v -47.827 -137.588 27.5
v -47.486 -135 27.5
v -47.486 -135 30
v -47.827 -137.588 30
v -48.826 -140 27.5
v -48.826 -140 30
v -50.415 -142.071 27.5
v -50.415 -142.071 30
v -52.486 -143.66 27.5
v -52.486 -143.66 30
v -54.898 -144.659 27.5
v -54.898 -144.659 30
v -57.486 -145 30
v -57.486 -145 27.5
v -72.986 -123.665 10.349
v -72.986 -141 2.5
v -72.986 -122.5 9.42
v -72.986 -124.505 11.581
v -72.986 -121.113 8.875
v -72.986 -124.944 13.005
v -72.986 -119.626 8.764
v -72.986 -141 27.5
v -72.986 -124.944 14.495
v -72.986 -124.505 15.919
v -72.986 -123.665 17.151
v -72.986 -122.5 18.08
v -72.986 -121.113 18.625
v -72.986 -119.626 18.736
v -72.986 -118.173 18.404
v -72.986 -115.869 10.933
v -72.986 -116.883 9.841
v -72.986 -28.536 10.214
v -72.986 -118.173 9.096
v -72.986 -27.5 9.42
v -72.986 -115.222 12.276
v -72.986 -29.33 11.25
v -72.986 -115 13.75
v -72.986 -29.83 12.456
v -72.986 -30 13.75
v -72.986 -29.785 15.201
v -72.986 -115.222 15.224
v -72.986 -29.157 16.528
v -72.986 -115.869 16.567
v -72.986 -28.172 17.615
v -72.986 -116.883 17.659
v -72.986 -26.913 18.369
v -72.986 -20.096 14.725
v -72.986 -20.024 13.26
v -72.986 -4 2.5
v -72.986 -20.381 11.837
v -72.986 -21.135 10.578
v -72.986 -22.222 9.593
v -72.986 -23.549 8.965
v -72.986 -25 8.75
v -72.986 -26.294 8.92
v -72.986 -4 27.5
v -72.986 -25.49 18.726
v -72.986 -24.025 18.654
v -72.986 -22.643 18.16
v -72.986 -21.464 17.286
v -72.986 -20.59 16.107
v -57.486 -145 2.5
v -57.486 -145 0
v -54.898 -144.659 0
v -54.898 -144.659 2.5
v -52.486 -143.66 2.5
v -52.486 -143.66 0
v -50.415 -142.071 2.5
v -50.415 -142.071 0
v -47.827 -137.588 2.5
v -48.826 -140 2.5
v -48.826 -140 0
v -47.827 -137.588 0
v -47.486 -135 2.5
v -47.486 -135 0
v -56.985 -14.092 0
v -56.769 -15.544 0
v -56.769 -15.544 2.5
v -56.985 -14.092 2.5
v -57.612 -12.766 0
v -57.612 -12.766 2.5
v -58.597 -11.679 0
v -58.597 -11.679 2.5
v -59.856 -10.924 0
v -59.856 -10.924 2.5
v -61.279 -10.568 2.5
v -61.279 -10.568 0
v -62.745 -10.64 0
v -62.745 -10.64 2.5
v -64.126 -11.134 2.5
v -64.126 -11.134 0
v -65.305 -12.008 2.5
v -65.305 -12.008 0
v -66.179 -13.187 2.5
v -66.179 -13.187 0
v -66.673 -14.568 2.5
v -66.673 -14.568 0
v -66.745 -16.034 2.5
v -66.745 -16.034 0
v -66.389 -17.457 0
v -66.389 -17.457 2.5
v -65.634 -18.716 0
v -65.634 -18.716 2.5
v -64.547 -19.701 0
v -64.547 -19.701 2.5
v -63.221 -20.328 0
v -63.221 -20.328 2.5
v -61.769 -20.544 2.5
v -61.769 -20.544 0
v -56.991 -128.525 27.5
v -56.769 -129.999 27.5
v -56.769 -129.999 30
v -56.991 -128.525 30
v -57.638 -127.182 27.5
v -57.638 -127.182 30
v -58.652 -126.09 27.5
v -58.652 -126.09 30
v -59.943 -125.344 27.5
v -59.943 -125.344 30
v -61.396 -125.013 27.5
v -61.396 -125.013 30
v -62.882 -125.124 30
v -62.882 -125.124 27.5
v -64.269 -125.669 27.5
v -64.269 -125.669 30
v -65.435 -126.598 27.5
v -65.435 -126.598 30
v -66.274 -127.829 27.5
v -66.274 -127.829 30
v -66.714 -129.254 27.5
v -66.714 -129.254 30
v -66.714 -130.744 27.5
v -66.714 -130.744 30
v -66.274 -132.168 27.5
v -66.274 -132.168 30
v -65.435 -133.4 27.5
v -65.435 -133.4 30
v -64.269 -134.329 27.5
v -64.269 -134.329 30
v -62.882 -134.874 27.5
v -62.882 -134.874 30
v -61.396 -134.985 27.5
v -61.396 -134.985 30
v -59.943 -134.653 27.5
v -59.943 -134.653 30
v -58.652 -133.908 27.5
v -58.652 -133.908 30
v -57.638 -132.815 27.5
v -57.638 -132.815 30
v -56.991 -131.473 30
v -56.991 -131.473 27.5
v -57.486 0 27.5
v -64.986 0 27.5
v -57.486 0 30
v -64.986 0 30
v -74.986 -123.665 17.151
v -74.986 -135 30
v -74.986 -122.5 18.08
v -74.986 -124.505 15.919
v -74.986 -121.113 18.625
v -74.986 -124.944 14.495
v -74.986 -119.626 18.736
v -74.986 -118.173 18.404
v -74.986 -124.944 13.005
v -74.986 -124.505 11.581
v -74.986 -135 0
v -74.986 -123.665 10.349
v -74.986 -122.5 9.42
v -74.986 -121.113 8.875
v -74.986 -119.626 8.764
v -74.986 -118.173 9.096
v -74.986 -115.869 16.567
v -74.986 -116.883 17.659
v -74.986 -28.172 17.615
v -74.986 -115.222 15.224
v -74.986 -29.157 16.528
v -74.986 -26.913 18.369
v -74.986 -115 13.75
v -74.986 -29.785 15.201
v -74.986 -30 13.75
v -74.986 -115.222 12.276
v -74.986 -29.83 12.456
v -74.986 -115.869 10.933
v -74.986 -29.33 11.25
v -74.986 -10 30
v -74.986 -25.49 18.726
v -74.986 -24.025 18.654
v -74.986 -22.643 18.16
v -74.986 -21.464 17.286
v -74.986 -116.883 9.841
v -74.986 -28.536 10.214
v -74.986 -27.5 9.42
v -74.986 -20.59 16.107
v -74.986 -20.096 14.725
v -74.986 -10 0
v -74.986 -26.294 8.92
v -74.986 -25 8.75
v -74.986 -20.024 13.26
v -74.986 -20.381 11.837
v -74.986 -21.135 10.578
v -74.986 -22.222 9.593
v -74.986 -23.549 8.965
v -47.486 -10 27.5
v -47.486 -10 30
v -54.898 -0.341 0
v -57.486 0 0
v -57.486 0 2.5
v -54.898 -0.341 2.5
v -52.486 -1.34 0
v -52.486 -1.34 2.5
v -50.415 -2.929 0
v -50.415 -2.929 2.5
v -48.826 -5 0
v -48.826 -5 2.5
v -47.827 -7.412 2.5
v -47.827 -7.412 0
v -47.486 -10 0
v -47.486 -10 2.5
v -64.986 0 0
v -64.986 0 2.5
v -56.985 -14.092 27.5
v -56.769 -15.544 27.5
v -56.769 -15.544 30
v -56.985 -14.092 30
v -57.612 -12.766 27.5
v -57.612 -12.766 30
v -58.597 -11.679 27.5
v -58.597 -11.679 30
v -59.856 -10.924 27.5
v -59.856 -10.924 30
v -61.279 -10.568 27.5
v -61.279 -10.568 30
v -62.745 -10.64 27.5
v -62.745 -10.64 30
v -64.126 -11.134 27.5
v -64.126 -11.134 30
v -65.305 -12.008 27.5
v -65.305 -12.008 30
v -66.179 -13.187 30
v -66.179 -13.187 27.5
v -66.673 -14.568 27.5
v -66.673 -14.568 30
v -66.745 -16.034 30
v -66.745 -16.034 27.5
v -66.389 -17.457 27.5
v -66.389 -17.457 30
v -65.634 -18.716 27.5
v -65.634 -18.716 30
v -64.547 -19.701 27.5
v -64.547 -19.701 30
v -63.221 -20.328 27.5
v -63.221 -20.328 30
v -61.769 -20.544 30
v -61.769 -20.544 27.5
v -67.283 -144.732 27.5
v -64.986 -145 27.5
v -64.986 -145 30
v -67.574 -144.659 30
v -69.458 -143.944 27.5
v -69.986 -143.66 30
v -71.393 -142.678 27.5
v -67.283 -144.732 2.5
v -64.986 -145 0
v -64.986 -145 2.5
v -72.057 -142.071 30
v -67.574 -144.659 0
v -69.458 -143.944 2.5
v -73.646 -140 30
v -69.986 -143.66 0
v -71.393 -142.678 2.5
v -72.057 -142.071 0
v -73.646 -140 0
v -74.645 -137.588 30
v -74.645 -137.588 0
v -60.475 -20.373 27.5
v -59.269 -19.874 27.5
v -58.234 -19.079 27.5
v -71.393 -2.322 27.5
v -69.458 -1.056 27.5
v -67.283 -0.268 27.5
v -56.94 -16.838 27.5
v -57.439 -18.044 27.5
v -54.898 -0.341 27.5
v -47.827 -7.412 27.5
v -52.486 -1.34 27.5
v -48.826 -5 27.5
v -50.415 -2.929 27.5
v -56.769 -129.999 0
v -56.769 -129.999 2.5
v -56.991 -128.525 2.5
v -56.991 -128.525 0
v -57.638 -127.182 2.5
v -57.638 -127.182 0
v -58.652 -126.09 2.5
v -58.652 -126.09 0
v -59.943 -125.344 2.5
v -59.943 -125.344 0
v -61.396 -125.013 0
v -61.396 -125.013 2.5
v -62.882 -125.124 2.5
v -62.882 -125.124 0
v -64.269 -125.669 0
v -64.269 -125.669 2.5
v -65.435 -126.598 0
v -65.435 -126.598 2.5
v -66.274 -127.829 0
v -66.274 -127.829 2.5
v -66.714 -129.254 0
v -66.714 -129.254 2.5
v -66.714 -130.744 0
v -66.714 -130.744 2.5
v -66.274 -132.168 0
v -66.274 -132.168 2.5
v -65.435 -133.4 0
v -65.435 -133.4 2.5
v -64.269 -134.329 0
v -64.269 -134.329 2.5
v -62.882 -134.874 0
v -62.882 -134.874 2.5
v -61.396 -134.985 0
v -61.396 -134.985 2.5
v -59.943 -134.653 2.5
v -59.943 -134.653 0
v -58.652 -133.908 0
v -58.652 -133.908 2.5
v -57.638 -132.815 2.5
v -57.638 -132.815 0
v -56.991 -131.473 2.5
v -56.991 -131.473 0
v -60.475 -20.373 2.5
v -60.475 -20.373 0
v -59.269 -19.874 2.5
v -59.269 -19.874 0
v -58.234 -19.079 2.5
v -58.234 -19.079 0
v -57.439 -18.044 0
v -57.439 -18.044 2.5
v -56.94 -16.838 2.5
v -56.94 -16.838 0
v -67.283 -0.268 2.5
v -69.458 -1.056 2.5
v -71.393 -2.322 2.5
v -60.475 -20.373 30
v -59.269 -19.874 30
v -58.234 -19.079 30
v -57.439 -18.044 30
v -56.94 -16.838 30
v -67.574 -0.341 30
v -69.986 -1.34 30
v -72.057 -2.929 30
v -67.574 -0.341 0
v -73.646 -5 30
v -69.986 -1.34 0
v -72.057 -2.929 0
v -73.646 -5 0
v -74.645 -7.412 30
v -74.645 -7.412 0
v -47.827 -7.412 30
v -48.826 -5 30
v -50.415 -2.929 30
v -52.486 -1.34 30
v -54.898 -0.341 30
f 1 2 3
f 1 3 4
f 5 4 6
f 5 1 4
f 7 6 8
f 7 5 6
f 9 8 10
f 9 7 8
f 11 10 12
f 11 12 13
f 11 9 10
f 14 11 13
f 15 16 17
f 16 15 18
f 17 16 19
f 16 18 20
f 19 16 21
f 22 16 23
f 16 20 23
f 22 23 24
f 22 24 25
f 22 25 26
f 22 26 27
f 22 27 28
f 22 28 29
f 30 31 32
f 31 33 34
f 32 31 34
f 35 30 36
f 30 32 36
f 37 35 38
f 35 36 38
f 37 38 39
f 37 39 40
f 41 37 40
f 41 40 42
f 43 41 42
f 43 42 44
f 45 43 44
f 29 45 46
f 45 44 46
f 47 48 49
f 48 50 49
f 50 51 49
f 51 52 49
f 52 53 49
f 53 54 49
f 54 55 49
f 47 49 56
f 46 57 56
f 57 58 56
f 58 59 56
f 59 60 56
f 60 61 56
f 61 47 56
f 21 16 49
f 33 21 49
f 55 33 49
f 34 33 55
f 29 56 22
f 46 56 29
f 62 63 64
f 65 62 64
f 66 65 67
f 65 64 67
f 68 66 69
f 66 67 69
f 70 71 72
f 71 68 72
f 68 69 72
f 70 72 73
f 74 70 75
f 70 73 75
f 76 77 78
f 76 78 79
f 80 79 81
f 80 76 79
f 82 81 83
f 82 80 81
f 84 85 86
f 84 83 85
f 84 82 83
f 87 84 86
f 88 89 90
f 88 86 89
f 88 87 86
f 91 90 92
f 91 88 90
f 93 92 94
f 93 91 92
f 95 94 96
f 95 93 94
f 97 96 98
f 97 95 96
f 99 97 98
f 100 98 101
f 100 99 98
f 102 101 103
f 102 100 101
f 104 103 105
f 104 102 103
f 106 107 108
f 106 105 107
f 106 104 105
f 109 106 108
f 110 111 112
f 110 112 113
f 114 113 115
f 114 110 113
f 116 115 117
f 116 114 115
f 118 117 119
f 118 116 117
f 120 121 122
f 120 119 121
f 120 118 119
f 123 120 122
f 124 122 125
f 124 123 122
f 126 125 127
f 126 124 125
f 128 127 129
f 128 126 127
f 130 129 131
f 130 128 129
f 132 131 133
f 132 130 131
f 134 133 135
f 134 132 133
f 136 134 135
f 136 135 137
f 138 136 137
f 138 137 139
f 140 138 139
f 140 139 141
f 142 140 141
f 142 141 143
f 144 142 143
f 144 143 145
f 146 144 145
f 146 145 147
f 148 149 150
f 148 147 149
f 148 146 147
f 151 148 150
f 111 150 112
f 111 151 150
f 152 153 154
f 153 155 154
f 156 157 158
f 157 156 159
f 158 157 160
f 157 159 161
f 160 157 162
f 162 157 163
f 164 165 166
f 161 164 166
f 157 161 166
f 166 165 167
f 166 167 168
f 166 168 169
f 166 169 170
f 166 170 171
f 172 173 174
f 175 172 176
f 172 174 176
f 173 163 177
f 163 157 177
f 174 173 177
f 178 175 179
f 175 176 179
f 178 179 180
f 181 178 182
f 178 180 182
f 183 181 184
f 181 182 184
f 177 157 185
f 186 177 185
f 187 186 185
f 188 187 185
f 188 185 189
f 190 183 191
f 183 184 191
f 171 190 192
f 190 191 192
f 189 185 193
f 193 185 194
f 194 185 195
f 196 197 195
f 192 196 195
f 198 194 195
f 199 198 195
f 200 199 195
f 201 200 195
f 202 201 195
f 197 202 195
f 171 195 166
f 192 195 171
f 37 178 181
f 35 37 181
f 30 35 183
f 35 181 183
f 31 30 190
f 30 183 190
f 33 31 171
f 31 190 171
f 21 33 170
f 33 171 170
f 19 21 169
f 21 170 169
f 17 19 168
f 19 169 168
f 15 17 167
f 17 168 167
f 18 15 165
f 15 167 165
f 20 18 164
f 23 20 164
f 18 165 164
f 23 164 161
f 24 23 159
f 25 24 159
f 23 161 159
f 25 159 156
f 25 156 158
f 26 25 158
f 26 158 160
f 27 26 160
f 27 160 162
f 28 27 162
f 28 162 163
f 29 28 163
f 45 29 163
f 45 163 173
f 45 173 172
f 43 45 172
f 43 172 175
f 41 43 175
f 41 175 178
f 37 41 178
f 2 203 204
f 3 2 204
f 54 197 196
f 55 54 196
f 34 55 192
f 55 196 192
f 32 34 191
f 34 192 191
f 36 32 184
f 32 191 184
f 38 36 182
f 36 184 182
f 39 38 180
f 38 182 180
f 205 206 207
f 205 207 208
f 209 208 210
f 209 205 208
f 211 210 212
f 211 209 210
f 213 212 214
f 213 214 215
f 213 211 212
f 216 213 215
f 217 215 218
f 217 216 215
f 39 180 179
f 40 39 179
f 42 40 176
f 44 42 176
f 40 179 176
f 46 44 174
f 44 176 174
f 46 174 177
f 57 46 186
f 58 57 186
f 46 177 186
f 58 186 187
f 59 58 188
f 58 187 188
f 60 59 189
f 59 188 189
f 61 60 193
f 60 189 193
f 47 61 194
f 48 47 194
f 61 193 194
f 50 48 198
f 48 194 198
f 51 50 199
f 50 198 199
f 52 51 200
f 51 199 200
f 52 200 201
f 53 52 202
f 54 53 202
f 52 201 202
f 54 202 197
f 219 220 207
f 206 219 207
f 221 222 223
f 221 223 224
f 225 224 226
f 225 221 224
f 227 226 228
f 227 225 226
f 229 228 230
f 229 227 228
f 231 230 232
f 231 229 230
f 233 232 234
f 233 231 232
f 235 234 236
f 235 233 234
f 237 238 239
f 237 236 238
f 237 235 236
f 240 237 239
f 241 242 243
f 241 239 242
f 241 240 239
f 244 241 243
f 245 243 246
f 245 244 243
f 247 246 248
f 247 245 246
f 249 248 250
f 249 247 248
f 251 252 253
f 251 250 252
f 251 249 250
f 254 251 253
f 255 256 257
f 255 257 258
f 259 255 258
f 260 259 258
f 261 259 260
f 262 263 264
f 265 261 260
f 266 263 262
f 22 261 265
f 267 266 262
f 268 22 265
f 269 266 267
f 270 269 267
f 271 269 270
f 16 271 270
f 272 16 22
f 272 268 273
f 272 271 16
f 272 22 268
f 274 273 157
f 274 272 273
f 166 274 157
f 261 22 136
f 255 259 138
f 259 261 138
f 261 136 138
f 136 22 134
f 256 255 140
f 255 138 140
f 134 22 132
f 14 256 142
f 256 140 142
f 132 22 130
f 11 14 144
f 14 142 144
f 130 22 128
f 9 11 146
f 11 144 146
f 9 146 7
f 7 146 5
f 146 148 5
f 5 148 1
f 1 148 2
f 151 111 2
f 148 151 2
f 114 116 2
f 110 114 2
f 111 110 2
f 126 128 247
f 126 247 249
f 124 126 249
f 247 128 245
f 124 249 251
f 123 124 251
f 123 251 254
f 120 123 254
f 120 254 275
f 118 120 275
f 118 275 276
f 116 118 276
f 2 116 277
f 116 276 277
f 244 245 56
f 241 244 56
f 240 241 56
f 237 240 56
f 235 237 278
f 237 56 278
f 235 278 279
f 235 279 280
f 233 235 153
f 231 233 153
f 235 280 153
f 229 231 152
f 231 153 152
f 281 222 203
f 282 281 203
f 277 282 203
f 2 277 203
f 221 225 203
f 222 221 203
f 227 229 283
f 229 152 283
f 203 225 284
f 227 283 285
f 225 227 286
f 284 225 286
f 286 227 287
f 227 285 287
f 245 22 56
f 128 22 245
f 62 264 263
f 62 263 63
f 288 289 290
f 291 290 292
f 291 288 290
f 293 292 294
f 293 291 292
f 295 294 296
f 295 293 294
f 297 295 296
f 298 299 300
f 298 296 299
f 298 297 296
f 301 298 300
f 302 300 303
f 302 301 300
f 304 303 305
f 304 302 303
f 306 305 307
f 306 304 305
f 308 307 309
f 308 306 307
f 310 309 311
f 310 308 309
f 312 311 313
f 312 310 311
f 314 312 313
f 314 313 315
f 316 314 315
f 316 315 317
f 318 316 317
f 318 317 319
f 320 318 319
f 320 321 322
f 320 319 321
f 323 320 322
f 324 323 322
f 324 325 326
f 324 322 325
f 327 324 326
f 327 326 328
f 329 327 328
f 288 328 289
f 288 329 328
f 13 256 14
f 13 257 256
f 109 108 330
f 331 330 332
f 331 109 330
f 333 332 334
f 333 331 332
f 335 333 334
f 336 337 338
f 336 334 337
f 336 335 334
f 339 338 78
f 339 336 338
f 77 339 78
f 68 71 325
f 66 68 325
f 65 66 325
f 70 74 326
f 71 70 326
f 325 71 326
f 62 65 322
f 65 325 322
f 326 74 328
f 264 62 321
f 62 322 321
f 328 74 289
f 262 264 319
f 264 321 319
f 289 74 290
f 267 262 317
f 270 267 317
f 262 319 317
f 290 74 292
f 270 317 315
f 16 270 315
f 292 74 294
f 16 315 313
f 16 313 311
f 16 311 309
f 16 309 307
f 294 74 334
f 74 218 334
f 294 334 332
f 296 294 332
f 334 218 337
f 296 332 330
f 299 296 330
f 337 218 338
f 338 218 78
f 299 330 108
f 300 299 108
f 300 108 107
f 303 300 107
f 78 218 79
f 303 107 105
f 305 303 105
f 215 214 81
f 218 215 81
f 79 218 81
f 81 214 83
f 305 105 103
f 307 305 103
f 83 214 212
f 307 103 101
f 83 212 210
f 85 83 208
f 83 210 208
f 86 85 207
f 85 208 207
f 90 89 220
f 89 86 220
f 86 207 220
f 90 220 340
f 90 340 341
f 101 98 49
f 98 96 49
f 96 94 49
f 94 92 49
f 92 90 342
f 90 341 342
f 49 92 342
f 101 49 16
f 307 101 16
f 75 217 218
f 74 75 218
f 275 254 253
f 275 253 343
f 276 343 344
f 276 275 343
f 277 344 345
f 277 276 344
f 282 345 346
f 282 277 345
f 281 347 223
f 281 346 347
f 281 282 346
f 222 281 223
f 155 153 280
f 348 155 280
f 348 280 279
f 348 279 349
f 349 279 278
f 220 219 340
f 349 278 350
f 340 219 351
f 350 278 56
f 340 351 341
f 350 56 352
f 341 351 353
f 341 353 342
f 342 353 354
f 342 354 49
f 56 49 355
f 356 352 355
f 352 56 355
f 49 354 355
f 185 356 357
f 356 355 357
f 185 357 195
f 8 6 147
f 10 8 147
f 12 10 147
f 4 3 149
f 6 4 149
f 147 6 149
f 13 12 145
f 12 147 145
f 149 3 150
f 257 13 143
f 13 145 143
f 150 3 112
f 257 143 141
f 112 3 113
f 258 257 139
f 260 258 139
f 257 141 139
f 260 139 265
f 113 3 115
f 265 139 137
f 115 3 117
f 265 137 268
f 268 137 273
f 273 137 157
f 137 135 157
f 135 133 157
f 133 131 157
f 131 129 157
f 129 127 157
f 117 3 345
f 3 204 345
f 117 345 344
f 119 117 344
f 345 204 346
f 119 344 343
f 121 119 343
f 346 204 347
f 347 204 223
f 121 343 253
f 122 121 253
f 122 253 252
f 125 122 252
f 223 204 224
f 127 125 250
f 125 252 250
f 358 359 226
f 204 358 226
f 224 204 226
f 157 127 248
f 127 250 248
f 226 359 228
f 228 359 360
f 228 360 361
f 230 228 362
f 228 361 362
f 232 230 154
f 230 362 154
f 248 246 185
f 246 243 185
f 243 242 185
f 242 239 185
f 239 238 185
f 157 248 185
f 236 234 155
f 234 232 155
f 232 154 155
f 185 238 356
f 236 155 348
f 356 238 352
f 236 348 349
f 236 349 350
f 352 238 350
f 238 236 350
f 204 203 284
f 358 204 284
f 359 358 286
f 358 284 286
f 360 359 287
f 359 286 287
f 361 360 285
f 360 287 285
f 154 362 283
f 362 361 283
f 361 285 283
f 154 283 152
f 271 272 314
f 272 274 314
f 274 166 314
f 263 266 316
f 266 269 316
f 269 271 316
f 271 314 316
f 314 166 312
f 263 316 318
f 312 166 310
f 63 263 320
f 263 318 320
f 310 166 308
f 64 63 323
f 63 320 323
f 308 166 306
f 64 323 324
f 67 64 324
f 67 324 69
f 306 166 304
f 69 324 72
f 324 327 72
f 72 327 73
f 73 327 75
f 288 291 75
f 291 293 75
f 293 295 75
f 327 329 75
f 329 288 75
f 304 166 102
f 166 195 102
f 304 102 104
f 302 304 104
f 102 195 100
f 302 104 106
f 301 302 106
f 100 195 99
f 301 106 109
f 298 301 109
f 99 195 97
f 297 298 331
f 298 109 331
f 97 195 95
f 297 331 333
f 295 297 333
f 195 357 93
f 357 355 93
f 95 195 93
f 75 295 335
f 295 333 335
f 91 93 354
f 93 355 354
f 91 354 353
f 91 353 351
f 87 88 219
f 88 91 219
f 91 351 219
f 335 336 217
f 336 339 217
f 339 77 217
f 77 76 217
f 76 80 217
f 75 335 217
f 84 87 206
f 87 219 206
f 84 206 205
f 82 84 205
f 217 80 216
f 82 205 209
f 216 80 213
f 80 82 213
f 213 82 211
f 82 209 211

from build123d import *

# Parameters (mm, degrees)
F2_DEPTH    = 145
F1_R        = 5
F3_DEPTH    = 46
F4_T1_DEPTH = 52.5
F4_T3_DEPTH = 52.5
F4_T5_DEPTH = 80
F7_DEPTH    = 25


# Not quite as in the source:
# - a fillet or chamfer that OpenCascade refuses, or shapes differently, is made with other operations: its cross-section is extruded or revolved along the edge and cut away or added


with BuildPart() as f2:
    # F0 (on Front) → F2 (new body)
    with BuildSketch(Plane.XZ):
        Polygon((-74.9858543277, 30), (-74.9858543277, 0), (-47.4858543277, 0), (-47.4858543277, 2.5), (-72.9858543277, 2.5), (-72.9858543277, 27.5), (-47.4858543277, 27.5), (-47.4858543277, 30), align=None)
    extrude(amount=F2_DEPTH)

    # F1 (on Top) → F3 (cut)
    with BuildSketch(Plane.XY):
        with BuildLine():
            ThreePointArc((-59.9858543277, -290), (-54.9858543277, -295), (-49.9858543277, -290))
            ThreePointArc((-49.9858543277, -290), (-54.9858543277, -285), (-59.9858543277, -290))
        make_face()
        with Locations((-54.9858543277, -260)):
            Circle(F1_R)
        with Locations((-61.7693625391, -129.9988627434)):
            Circle(F1_R)
        with BuildLine():
            ThreePointArc((-61.7693625391, -20.5436318724), (-58.2338286331, -19.0791657783), (-56.7693625391, -15.5436318724))
            ThreePointArc((-56.7693625391, -15.5436318724), (-65.304896445, -12.0080979665), (-61.7693625391, -20.5436318724))
        make_face()
    extrude(amount=F3_DEPTH, mode=Mode.SUBTRACT)

    # F4: fillet of radius 10 on 6 edges, made by hand

    # F4_s2 → F4_t1 (cut)
    with BuildSketch(Plane.XY.offset(-25)):
        with BuildLine():
            ThreePointArc((-57.4858543277, 0), (-50.4147865158, -2.9289321881), (-47.4858543277, -10))
            Line((-47.4858543277, -10), (-47.4858543277, 0))
            Line((-47.4858543277, 0), (-57.4858543277, 0))
        make_face()
        with BuildLine():
            ThreePointArc((-57.4858543277, -145), (-50.4147865158, -142.0710678119), (-47.4858543277, -135))
            Line((-47.4858543277, -135), (-47.4858543277, -145))
            Line((-47.4858543277, -145), (-57.4858543277, -145))
        make_face()
    extrude(amount=F4_T1_DEPTH, mode=Mode.SUBTRACT)

    # F4_s4 → F4_t3 (cut)
    with BuildSketch(Plane.XY.offset(2.5)):
        with BuildLine():
            ThreePointArc((-47.4858543277, -10), (-50.4147865158, -2.9289321881), (-57.4858543277, 0))
            Line((-57.4858543277, 0), (-47.4858543277, 0))
            Line((-47.4858543277, 0), (-47.4858543277, -10))
        make_face()
        with BuildLine():
            ThreePointArc((-47.4858543277, -135), (-50.4147865158, -142.0710678119), (-57.4858543277, -145))
            Line((-57.4858543277, -145), (-47.4858543277, -145))
            Line((-47.4858543277, -145), (-47.4858543277, -135))
        make_face()
    extrude(amount=F4_T3_DEPTH, mode=Mode.SUBTRACT)

    # F4_s6 → F4_t5 (cut)
    with BuildSketch(Plane.XY.offset(-25)):
        with BuildLine():
            ThreePointArc((-64.9858543277, 0), (-72.0569221395, -2.9289321881), (-74.9858543277, -10))
            Line((-74.9858543277, -10), (-74.9858543277, 0))
            Line((-74.9858543277, 0), (-64.9858543277, 0))
        make_face()
        with BuildLine():
            ThreePointArc((-64.9858543277, -145), (-72.0569221395, -142.0710678119), (-74.9858543277, -135))
            Line((-74.9858543277, -135), (-74.9858543277, -145))
            Line((-74.9858543277, -145), (-64.9858543277, -145))
        make_face()
    extrude(amount=F4_T5_DEPTH, mode=Mode.SUBTRACT)

    # F6 (on offset) → F7 (cut)
    with BuildSketch(Plane(origin=(-74.9858543277, 0, 0), x_dir=(0, -1, 0), z_dir=(-1, 0, 0))):
        with BuildLine():
            ThreePointArc((30, 13.75), (21.4644660941, 17.2855339059), (25, 8.75))
            Line((25, 8.75), (25, 13.75))
            Line((25, 13.75), (30, 13.75))
        make_face()
        with BuildLine():
            Line((25, 13.75), (25, 8.75))
            ThreePointArc((25, 8.75), (28.5355339059, 10.2144660941), (30, 13.75))
            Line((30, 13.75), (25, 13.75))
        make_face()
        with BuildLine():
            Line((120, 13.75), (125, 13.75))
            ThreePointArc((125, 13.75), (120, 18.75), (115, 13.75))
            Line((115, 13.75), (120, 13.75))
        make_face()
        with BuildLine():
            ThreePointArc((115, 13.75), (120, 8.75), (125, 13.75))
            Line((125, 13.75), (120, 13.75))
            Line((120, 13.75), (115, 13.75))
        make_face()
    extrude(amount=-F7_DEPTH, mode=Mode.SUBTRACT)


solid = f2.part
